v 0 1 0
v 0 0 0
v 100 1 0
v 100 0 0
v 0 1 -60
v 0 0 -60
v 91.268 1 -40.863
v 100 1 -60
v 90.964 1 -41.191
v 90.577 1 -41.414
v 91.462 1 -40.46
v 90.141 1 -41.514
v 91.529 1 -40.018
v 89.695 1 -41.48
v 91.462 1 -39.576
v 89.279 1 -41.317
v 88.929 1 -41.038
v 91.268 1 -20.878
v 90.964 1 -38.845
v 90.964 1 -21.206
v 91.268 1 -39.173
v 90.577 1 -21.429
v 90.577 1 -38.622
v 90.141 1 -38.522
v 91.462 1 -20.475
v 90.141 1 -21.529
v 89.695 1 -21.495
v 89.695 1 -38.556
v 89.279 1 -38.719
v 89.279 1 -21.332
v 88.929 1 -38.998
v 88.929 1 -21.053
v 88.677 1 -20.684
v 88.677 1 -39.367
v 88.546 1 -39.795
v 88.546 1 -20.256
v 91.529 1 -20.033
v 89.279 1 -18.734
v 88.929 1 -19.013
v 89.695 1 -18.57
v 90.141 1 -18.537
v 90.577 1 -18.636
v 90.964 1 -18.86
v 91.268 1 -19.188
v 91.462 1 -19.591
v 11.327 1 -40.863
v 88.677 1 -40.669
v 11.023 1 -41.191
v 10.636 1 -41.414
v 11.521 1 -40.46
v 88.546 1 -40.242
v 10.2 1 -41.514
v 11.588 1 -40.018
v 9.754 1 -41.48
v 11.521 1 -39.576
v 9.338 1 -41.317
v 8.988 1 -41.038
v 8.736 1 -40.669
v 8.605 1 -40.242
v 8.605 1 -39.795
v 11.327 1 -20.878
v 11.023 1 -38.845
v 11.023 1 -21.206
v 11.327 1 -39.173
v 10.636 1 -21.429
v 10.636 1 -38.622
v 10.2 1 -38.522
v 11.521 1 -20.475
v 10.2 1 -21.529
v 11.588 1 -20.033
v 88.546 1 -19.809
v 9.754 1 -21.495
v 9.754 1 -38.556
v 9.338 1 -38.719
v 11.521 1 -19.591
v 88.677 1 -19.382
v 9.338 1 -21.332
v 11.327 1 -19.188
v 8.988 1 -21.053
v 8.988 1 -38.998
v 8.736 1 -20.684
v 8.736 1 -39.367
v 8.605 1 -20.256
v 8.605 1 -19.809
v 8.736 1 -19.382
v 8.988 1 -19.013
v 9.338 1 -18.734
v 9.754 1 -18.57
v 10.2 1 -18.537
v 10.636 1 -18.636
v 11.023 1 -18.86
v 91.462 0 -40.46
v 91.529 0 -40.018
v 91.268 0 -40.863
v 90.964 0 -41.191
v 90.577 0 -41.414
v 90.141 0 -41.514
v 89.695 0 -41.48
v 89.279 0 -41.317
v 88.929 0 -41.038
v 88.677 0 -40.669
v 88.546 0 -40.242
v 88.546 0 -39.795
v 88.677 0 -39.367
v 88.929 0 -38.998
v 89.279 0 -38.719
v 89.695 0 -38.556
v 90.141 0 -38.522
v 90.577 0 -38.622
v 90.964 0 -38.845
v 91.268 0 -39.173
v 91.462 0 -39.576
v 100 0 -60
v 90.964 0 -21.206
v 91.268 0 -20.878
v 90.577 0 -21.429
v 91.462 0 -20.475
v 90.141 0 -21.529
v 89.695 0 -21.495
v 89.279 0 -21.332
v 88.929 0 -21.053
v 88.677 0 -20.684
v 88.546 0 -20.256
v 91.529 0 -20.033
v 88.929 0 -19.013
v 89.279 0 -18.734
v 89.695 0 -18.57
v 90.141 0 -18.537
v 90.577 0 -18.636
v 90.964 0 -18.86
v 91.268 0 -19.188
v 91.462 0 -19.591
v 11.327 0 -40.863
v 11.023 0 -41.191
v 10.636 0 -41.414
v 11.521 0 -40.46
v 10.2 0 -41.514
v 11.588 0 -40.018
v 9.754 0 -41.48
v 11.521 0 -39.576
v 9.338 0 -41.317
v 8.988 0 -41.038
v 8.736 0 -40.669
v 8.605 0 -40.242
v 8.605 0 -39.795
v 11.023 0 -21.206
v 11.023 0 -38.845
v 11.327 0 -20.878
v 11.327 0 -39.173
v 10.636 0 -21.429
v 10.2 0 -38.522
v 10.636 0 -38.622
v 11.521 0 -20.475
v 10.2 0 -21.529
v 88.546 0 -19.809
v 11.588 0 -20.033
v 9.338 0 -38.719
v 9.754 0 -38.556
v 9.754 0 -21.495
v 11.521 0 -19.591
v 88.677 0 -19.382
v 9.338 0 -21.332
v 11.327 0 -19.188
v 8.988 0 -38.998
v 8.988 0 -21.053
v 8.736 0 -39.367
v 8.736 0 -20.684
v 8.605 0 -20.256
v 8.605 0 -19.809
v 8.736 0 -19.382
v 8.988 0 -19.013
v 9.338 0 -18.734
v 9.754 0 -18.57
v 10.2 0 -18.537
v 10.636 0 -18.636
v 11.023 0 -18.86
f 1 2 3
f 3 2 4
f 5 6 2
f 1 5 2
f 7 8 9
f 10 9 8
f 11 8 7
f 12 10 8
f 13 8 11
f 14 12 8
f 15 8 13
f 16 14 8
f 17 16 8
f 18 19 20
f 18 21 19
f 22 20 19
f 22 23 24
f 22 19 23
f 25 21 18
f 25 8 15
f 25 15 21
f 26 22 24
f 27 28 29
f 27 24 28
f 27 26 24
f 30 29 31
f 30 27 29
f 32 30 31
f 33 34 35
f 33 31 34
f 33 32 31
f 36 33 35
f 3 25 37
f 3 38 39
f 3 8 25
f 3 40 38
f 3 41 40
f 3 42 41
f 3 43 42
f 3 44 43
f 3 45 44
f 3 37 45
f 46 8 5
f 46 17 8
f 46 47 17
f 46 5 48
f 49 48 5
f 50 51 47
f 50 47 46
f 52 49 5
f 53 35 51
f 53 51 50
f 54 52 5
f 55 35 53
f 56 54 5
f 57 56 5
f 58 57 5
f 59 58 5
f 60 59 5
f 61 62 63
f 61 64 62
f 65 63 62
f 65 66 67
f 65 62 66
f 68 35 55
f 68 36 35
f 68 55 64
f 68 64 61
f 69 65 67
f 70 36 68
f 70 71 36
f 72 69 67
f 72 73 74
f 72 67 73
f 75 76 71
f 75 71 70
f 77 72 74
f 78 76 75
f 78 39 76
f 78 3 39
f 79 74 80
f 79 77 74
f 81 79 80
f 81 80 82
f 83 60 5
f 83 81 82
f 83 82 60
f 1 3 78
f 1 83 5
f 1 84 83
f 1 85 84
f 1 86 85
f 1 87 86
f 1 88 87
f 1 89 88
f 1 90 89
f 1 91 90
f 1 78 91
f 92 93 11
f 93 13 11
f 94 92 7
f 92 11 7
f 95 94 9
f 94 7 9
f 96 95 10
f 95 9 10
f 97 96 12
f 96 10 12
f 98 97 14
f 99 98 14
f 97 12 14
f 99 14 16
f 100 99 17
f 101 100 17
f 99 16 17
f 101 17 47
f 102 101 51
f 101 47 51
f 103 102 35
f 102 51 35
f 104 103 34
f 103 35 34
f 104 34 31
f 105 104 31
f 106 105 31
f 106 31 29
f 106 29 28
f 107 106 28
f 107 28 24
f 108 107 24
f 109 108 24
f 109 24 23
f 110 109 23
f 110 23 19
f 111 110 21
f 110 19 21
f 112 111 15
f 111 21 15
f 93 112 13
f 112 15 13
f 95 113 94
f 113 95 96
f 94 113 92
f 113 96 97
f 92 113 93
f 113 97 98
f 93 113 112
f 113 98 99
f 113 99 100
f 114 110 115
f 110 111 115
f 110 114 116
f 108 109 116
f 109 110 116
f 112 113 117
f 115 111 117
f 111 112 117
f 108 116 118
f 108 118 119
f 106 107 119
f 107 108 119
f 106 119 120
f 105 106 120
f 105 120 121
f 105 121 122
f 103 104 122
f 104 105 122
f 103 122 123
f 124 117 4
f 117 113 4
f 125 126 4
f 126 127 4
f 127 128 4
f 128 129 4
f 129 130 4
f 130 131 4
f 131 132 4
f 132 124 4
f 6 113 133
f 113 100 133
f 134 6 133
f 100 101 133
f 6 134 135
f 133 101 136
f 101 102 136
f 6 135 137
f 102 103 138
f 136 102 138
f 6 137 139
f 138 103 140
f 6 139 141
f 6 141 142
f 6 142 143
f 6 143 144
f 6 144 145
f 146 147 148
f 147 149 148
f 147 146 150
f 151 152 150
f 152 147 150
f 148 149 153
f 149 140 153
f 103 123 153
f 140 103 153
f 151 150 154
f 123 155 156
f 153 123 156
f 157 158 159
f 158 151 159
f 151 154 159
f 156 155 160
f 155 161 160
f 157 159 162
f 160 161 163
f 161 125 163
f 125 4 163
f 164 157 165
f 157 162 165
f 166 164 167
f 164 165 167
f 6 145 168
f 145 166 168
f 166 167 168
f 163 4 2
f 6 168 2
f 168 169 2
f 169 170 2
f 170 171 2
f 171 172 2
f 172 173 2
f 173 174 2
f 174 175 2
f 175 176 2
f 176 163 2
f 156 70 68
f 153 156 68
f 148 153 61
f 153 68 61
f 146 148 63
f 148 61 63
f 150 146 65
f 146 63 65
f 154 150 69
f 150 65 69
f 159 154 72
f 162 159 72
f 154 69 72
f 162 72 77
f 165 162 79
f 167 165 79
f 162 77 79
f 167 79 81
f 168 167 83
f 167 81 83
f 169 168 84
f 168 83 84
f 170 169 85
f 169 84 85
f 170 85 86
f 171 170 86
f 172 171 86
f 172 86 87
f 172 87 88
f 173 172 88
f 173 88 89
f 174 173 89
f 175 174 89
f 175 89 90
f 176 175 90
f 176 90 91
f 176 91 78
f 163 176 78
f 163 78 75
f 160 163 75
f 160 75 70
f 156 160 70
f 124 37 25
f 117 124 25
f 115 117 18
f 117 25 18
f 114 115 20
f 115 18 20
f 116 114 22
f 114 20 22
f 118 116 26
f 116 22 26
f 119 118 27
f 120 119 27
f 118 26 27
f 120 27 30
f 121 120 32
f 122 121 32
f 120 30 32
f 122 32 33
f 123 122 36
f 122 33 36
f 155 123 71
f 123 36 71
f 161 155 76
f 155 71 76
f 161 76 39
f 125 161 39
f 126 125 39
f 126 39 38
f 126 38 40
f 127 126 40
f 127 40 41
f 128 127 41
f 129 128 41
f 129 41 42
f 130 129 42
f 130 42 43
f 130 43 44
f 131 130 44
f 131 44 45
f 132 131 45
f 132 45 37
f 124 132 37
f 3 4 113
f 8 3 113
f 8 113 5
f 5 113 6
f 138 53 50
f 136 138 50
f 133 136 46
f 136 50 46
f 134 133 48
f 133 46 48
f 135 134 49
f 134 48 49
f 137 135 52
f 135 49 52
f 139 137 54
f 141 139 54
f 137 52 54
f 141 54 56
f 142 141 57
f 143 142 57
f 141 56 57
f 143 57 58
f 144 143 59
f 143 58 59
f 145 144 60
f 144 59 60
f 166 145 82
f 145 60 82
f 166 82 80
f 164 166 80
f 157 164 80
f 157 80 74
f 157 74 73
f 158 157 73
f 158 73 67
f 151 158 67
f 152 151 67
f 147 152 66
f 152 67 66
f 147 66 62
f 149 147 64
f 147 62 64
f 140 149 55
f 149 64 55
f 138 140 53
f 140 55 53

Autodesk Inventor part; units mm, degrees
ref_plane "YZ Plane" through (0, 0, 0) normal (1, 0, 0) x (0, 1, 0)
ref_plane "XZ Plane" through (0, 0, 0) normal (0, 1, 0) x (-1, 0, 0)
ref_plane "XY Plane" through (0, 0, 0) normal (0, 0, 1) x (1, 0, 0)
sketch "Sketch1" plane through (0, 0, 0) normal (0, 1, 0) x (-1, 0, 0)
  line L0 (0, 0) -> (-100, 0)
  line L1 (-100, 0) -> (-100, -60)
  line L2 (-100, -60) -> (0, -60)
  line L3 (0, -60) -> (0, 0)
  dimension "d2" = 100
  dimension "d3" = 60
extrude "Extrusion1" add sketch "Sketch1" along normal blind 1
sketch "Sketch3" plane through (0, 1, 0) normal (0, 1, 0) x (1, 0, 0)
  circle A0 centre (10.0878, 20.0328) radius 1.5
  circle A1 centre (10.0878, 40.0181) radius 1.5
  point P0 (0, 0)
  dimension "d11" = 3
  dimension "d12" = 3
extrude "Extrusion3" cut sketch "Sketch3" against normal blind 1
sketch "Sketch4" plane through (0, 1, 0) normal (0, 1, 0) x (1, 0, 0)
  point P0 (0, 0)
sketch "Sketch5" plane through (0, 1, 0) normal (0, 1, 0) x (1, 0, 0)
  point P0 (0, 0)
sketch "Sketch6" plane through (0, 1, 0) normal (0, 1, 0) x (1, 0, 0)
  point P0 (0, 0)
sketch "Sketch7" plane through (0, 1, 0) normal (0, 1, 0) x (1, 0, 0)
  circle A0 centre (90.0288, 20.0328) radius 1.5
  circle A1 centre (90.0288, 40.0181) radius 1.5
  point P0 (0, 0)
  dimension "d15" = 3
  dimension "d16" = 3
extrude "Extrusion4" cut sketch "Sketch7" against normal blind 1
properties part number "3dmodelling2"
